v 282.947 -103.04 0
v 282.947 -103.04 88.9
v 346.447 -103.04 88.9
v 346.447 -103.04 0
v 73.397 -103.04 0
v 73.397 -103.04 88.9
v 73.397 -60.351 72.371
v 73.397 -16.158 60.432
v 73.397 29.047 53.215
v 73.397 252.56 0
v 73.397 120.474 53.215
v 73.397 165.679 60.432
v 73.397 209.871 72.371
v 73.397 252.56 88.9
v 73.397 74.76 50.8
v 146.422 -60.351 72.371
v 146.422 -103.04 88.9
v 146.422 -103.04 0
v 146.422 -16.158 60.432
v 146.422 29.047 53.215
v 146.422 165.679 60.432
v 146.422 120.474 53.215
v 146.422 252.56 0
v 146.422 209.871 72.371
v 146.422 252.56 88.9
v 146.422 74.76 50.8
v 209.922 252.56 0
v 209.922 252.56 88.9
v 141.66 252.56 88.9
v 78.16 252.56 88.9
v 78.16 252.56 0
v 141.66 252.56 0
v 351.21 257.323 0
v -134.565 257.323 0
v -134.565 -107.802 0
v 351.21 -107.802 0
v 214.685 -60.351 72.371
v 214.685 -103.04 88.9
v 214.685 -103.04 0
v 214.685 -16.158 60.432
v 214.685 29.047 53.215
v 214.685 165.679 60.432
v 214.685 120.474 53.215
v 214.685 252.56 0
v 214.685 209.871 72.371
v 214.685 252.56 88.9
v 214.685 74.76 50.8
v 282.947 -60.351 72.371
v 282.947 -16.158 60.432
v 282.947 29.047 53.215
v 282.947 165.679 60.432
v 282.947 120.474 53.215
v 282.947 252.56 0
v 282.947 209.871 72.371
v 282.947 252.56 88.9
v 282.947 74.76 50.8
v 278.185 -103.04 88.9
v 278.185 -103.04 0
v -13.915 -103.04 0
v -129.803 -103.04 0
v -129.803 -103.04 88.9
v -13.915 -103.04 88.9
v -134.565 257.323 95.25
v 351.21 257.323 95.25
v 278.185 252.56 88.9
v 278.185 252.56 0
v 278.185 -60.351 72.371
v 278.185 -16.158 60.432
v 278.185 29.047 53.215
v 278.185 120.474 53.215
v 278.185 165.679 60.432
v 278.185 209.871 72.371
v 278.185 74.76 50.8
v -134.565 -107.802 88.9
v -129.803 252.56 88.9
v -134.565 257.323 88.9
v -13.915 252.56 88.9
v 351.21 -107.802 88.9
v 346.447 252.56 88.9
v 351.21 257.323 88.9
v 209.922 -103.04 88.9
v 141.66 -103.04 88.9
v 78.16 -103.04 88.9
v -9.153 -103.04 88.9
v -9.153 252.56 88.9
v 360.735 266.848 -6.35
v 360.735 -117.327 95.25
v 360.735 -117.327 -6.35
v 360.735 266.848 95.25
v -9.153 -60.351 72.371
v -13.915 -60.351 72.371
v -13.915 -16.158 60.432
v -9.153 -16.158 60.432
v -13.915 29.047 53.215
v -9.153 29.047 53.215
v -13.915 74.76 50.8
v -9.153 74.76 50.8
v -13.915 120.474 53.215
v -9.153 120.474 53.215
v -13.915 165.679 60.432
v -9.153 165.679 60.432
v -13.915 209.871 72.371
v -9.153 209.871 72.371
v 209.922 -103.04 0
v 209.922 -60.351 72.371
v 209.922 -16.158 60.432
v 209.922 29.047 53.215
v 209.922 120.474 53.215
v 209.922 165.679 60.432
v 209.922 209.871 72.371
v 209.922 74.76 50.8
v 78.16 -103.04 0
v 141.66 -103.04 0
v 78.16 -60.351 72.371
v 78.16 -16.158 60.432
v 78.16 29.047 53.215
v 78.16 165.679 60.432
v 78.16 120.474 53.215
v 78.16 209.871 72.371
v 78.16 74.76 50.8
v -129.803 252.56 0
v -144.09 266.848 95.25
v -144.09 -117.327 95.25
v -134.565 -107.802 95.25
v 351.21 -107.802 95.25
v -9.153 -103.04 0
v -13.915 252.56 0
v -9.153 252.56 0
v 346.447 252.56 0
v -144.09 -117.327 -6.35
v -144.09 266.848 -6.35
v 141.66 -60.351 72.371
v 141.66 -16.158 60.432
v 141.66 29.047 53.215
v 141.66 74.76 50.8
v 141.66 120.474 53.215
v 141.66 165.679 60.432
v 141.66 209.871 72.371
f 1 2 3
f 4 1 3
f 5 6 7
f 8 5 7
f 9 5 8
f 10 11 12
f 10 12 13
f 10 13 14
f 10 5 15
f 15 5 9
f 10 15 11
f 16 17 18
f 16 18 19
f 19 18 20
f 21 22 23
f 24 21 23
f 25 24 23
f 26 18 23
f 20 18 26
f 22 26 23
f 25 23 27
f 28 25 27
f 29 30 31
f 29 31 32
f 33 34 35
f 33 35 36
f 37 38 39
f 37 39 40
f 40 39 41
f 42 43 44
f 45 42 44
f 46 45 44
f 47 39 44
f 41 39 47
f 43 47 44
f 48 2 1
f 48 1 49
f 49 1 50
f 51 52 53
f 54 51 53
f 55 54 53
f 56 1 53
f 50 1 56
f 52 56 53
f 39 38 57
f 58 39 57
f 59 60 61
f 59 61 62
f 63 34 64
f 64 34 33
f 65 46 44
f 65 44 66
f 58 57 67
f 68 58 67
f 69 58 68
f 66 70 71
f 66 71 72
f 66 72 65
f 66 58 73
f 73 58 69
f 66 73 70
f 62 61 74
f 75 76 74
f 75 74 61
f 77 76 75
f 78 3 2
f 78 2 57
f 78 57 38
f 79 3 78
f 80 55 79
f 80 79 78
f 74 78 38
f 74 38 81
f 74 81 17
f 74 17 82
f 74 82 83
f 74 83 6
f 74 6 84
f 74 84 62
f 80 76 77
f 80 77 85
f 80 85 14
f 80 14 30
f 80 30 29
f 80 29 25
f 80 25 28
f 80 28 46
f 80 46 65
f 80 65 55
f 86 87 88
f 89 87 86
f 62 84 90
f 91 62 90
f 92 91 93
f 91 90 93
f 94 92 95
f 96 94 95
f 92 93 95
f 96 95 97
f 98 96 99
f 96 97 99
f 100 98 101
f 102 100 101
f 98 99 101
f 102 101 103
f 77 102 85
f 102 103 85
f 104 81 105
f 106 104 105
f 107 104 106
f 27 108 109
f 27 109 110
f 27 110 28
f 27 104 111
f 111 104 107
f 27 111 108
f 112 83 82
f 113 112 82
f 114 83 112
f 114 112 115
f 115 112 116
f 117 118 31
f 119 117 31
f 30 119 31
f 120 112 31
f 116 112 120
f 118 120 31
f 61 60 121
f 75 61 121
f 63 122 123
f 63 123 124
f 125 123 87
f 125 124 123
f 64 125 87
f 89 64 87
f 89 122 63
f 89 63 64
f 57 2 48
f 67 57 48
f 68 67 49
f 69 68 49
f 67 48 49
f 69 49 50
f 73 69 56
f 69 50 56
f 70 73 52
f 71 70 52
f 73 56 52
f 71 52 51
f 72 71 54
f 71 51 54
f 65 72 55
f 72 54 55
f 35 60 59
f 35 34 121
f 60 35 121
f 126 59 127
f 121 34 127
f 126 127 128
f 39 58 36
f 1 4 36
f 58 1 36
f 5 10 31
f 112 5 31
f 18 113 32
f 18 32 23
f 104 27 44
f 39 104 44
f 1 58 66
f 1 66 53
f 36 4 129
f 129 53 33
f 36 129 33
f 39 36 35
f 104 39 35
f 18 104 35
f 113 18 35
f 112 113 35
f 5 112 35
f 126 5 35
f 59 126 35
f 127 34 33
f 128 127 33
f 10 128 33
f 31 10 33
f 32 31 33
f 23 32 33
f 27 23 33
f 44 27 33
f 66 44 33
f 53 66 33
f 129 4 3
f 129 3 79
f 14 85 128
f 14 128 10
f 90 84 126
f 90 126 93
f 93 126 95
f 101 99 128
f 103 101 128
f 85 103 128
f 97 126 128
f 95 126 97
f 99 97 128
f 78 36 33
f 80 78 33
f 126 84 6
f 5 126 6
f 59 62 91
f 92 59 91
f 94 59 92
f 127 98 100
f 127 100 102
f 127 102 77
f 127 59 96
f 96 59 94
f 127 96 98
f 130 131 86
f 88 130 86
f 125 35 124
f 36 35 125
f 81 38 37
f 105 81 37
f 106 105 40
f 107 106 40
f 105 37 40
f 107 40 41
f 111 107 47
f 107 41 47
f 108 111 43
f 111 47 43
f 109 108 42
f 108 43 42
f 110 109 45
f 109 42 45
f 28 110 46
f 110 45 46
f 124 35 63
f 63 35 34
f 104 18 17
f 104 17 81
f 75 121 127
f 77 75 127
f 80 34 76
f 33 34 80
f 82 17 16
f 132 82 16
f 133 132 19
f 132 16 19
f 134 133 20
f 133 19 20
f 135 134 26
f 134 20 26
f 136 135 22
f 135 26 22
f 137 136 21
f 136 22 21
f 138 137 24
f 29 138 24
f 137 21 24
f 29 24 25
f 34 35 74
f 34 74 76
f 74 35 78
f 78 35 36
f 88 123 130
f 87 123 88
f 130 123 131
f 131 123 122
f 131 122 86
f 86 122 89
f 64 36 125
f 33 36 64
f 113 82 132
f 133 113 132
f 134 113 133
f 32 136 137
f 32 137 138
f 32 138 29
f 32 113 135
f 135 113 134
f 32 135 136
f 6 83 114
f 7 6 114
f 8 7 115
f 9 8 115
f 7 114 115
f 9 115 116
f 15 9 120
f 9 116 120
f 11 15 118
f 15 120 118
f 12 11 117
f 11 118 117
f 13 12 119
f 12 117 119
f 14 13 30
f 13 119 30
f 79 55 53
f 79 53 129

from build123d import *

# Parameters (mm, degrees)
F0_W     = 504.825
F0_H     = 384.175
F0_W_2   = 485.775
F0_H_2   = 365.125
F1_DEPTH = 95.25
F0_W_3   = 115.8875
F0_H_3   = 355.6
F0_W_4   = 82.55
F0_W_5   = 63.5
F2_DEPTH = 88.9
F3_W     = 504.825
F3_H     = 384.175
F4_DEPTH = 6.35
F6_DEPTH = 296.8625


with BuildPart() as f1:
    # F0 (on Top) → F1 (new body)
    with BuildSketch(Plane.XY):
        with Locations((108.3223706484, 74.7603473186)):
            Rectangle(F0_W, F0_H)
        with Locations((108.3223706484, 74.7603473186)):
            Rectangle(F0_W_2, F0_H_2, mode=Mode.SUBTRACT)
    extrude(amount=F1_DEPTH)

    # F3 (on face) → F4 (join)
    with BuildSketch(Plane.XY):
        with Locations((108.3223706484, 74.7603473186)):
            Rectangle(F3_W, F3_H)
    extrude(amount=-F4_DEPTH)


with BuildPart() as f2:
    # F0 (on Top) → F2 (new body)
    with BuildSketch(Plane.XY):
        with Locations((108.3223706484, 74.7603473186)):
            Rectangle(F0_W_2, F0_H_2)
        with Locations((-71.8588793516, 74.7603473186)):
            Rectangle(F0_W_3, F0_H_3, mode=Mode.SUBTRACT)
        with Locations((32.1223706484, 74.7603473186)):
            Rectangle(F0_W_4, F0_H_3, mode=Mode.SUBTRACT)
        with Locations((109.9098706484, 74.7603473186)):
            Rectangle(F0_W_5, F0_H_3, mode=Mode.SUBTRACT)
        with Locations((178.1723706484, 74.7603473186)):
            Rectangle(F0_W_5, F0_H_3, mode=Mode.SUBTRACT)
        with Locations((246.4348706484, 74.7603473186)):
            Rectangle(F0_W_5, F0_H_3, mode=Mode.SUBTRACT)
        with Locations((314.6973706484, 74.7603473186)):
            Rectangle(F0_W_5, F0_H_3, mode=Mode.SUBTRACT)
    extrude(amount=F2_DEPTH)

    # F5 (on face) → F6 (cut, through all)
    with BuildSketch(Plane.YZ.offset(282.9473706484)):
        with BuildLine():
            Line((252.5603473186, 88.9), (-103.0396526814, 88.9))
            ThreePointArc((-103.0396526814, 88.9), (74.7603473186, 50.8), (252.5603473186, 88.9))
        make_face()
    extrude(amount=-F6_DEPTH, mode=Mode.SUBTRACT)


solid = Compound([f1.part, f2.part])
